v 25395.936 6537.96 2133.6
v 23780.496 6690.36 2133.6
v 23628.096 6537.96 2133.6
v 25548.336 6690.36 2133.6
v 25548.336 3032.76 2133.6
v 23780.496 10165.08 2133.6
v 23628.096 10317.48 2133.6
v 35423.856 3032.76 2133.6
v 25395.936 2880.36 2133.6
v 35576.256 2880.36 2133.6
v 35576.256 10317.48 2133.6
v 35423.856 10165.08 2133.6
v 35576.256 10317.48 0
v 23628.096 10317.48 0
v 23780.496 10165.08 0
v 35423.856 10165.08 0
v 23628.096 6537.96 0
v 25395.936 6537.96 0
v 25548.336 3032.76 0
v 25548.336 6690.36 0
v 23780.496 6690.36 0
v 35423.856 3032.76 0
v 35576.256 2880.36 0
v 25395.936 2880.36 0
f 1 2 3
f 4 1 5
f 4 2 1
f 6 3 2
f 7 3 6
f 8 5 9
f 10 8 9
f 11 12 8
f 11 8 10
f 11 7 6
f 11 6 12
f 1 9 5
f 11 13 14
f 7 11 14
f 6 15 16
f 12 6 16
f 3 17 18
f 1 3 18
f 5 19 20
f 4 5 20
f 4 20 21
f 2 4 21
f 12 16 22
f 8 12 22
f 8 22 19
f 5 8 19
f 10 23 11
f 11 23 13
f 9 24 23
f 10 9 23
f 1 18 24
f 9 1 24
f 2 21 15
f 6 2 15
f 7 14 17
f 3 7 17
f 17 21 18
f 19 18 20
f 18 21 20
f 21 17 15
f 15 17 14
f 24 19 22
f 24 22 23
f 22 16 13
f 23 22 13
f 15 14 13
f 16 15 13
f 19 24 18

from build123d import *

# Parameters (mm, degrees)
F1_DEPTH = 2133.6


with BuildPart() as f1:
    # F0 (on Top) → F1 (new body)
    with BuildSketch(Plane.XY):
        Polygon((35576.256, 2880.36), (35576.256, 10317.48), (23628.096, 10317.48), (23628.096, 6537.96), (25395.936, 6537.96), (25395.936, 5059.497356), (25395.936, 2880.36), align=None)
        Polygon((25548.336, 3032.76), (25548.336, 6690.36), (23780.496, 6690.36), (23780.496, 10165.08), (35423.856, 10165.08), (35423.856, 3032.76), align=None, mode=Mode.SUBTRACT)
    extrude(amount=F1_DEPTH)


solid = f1.part
